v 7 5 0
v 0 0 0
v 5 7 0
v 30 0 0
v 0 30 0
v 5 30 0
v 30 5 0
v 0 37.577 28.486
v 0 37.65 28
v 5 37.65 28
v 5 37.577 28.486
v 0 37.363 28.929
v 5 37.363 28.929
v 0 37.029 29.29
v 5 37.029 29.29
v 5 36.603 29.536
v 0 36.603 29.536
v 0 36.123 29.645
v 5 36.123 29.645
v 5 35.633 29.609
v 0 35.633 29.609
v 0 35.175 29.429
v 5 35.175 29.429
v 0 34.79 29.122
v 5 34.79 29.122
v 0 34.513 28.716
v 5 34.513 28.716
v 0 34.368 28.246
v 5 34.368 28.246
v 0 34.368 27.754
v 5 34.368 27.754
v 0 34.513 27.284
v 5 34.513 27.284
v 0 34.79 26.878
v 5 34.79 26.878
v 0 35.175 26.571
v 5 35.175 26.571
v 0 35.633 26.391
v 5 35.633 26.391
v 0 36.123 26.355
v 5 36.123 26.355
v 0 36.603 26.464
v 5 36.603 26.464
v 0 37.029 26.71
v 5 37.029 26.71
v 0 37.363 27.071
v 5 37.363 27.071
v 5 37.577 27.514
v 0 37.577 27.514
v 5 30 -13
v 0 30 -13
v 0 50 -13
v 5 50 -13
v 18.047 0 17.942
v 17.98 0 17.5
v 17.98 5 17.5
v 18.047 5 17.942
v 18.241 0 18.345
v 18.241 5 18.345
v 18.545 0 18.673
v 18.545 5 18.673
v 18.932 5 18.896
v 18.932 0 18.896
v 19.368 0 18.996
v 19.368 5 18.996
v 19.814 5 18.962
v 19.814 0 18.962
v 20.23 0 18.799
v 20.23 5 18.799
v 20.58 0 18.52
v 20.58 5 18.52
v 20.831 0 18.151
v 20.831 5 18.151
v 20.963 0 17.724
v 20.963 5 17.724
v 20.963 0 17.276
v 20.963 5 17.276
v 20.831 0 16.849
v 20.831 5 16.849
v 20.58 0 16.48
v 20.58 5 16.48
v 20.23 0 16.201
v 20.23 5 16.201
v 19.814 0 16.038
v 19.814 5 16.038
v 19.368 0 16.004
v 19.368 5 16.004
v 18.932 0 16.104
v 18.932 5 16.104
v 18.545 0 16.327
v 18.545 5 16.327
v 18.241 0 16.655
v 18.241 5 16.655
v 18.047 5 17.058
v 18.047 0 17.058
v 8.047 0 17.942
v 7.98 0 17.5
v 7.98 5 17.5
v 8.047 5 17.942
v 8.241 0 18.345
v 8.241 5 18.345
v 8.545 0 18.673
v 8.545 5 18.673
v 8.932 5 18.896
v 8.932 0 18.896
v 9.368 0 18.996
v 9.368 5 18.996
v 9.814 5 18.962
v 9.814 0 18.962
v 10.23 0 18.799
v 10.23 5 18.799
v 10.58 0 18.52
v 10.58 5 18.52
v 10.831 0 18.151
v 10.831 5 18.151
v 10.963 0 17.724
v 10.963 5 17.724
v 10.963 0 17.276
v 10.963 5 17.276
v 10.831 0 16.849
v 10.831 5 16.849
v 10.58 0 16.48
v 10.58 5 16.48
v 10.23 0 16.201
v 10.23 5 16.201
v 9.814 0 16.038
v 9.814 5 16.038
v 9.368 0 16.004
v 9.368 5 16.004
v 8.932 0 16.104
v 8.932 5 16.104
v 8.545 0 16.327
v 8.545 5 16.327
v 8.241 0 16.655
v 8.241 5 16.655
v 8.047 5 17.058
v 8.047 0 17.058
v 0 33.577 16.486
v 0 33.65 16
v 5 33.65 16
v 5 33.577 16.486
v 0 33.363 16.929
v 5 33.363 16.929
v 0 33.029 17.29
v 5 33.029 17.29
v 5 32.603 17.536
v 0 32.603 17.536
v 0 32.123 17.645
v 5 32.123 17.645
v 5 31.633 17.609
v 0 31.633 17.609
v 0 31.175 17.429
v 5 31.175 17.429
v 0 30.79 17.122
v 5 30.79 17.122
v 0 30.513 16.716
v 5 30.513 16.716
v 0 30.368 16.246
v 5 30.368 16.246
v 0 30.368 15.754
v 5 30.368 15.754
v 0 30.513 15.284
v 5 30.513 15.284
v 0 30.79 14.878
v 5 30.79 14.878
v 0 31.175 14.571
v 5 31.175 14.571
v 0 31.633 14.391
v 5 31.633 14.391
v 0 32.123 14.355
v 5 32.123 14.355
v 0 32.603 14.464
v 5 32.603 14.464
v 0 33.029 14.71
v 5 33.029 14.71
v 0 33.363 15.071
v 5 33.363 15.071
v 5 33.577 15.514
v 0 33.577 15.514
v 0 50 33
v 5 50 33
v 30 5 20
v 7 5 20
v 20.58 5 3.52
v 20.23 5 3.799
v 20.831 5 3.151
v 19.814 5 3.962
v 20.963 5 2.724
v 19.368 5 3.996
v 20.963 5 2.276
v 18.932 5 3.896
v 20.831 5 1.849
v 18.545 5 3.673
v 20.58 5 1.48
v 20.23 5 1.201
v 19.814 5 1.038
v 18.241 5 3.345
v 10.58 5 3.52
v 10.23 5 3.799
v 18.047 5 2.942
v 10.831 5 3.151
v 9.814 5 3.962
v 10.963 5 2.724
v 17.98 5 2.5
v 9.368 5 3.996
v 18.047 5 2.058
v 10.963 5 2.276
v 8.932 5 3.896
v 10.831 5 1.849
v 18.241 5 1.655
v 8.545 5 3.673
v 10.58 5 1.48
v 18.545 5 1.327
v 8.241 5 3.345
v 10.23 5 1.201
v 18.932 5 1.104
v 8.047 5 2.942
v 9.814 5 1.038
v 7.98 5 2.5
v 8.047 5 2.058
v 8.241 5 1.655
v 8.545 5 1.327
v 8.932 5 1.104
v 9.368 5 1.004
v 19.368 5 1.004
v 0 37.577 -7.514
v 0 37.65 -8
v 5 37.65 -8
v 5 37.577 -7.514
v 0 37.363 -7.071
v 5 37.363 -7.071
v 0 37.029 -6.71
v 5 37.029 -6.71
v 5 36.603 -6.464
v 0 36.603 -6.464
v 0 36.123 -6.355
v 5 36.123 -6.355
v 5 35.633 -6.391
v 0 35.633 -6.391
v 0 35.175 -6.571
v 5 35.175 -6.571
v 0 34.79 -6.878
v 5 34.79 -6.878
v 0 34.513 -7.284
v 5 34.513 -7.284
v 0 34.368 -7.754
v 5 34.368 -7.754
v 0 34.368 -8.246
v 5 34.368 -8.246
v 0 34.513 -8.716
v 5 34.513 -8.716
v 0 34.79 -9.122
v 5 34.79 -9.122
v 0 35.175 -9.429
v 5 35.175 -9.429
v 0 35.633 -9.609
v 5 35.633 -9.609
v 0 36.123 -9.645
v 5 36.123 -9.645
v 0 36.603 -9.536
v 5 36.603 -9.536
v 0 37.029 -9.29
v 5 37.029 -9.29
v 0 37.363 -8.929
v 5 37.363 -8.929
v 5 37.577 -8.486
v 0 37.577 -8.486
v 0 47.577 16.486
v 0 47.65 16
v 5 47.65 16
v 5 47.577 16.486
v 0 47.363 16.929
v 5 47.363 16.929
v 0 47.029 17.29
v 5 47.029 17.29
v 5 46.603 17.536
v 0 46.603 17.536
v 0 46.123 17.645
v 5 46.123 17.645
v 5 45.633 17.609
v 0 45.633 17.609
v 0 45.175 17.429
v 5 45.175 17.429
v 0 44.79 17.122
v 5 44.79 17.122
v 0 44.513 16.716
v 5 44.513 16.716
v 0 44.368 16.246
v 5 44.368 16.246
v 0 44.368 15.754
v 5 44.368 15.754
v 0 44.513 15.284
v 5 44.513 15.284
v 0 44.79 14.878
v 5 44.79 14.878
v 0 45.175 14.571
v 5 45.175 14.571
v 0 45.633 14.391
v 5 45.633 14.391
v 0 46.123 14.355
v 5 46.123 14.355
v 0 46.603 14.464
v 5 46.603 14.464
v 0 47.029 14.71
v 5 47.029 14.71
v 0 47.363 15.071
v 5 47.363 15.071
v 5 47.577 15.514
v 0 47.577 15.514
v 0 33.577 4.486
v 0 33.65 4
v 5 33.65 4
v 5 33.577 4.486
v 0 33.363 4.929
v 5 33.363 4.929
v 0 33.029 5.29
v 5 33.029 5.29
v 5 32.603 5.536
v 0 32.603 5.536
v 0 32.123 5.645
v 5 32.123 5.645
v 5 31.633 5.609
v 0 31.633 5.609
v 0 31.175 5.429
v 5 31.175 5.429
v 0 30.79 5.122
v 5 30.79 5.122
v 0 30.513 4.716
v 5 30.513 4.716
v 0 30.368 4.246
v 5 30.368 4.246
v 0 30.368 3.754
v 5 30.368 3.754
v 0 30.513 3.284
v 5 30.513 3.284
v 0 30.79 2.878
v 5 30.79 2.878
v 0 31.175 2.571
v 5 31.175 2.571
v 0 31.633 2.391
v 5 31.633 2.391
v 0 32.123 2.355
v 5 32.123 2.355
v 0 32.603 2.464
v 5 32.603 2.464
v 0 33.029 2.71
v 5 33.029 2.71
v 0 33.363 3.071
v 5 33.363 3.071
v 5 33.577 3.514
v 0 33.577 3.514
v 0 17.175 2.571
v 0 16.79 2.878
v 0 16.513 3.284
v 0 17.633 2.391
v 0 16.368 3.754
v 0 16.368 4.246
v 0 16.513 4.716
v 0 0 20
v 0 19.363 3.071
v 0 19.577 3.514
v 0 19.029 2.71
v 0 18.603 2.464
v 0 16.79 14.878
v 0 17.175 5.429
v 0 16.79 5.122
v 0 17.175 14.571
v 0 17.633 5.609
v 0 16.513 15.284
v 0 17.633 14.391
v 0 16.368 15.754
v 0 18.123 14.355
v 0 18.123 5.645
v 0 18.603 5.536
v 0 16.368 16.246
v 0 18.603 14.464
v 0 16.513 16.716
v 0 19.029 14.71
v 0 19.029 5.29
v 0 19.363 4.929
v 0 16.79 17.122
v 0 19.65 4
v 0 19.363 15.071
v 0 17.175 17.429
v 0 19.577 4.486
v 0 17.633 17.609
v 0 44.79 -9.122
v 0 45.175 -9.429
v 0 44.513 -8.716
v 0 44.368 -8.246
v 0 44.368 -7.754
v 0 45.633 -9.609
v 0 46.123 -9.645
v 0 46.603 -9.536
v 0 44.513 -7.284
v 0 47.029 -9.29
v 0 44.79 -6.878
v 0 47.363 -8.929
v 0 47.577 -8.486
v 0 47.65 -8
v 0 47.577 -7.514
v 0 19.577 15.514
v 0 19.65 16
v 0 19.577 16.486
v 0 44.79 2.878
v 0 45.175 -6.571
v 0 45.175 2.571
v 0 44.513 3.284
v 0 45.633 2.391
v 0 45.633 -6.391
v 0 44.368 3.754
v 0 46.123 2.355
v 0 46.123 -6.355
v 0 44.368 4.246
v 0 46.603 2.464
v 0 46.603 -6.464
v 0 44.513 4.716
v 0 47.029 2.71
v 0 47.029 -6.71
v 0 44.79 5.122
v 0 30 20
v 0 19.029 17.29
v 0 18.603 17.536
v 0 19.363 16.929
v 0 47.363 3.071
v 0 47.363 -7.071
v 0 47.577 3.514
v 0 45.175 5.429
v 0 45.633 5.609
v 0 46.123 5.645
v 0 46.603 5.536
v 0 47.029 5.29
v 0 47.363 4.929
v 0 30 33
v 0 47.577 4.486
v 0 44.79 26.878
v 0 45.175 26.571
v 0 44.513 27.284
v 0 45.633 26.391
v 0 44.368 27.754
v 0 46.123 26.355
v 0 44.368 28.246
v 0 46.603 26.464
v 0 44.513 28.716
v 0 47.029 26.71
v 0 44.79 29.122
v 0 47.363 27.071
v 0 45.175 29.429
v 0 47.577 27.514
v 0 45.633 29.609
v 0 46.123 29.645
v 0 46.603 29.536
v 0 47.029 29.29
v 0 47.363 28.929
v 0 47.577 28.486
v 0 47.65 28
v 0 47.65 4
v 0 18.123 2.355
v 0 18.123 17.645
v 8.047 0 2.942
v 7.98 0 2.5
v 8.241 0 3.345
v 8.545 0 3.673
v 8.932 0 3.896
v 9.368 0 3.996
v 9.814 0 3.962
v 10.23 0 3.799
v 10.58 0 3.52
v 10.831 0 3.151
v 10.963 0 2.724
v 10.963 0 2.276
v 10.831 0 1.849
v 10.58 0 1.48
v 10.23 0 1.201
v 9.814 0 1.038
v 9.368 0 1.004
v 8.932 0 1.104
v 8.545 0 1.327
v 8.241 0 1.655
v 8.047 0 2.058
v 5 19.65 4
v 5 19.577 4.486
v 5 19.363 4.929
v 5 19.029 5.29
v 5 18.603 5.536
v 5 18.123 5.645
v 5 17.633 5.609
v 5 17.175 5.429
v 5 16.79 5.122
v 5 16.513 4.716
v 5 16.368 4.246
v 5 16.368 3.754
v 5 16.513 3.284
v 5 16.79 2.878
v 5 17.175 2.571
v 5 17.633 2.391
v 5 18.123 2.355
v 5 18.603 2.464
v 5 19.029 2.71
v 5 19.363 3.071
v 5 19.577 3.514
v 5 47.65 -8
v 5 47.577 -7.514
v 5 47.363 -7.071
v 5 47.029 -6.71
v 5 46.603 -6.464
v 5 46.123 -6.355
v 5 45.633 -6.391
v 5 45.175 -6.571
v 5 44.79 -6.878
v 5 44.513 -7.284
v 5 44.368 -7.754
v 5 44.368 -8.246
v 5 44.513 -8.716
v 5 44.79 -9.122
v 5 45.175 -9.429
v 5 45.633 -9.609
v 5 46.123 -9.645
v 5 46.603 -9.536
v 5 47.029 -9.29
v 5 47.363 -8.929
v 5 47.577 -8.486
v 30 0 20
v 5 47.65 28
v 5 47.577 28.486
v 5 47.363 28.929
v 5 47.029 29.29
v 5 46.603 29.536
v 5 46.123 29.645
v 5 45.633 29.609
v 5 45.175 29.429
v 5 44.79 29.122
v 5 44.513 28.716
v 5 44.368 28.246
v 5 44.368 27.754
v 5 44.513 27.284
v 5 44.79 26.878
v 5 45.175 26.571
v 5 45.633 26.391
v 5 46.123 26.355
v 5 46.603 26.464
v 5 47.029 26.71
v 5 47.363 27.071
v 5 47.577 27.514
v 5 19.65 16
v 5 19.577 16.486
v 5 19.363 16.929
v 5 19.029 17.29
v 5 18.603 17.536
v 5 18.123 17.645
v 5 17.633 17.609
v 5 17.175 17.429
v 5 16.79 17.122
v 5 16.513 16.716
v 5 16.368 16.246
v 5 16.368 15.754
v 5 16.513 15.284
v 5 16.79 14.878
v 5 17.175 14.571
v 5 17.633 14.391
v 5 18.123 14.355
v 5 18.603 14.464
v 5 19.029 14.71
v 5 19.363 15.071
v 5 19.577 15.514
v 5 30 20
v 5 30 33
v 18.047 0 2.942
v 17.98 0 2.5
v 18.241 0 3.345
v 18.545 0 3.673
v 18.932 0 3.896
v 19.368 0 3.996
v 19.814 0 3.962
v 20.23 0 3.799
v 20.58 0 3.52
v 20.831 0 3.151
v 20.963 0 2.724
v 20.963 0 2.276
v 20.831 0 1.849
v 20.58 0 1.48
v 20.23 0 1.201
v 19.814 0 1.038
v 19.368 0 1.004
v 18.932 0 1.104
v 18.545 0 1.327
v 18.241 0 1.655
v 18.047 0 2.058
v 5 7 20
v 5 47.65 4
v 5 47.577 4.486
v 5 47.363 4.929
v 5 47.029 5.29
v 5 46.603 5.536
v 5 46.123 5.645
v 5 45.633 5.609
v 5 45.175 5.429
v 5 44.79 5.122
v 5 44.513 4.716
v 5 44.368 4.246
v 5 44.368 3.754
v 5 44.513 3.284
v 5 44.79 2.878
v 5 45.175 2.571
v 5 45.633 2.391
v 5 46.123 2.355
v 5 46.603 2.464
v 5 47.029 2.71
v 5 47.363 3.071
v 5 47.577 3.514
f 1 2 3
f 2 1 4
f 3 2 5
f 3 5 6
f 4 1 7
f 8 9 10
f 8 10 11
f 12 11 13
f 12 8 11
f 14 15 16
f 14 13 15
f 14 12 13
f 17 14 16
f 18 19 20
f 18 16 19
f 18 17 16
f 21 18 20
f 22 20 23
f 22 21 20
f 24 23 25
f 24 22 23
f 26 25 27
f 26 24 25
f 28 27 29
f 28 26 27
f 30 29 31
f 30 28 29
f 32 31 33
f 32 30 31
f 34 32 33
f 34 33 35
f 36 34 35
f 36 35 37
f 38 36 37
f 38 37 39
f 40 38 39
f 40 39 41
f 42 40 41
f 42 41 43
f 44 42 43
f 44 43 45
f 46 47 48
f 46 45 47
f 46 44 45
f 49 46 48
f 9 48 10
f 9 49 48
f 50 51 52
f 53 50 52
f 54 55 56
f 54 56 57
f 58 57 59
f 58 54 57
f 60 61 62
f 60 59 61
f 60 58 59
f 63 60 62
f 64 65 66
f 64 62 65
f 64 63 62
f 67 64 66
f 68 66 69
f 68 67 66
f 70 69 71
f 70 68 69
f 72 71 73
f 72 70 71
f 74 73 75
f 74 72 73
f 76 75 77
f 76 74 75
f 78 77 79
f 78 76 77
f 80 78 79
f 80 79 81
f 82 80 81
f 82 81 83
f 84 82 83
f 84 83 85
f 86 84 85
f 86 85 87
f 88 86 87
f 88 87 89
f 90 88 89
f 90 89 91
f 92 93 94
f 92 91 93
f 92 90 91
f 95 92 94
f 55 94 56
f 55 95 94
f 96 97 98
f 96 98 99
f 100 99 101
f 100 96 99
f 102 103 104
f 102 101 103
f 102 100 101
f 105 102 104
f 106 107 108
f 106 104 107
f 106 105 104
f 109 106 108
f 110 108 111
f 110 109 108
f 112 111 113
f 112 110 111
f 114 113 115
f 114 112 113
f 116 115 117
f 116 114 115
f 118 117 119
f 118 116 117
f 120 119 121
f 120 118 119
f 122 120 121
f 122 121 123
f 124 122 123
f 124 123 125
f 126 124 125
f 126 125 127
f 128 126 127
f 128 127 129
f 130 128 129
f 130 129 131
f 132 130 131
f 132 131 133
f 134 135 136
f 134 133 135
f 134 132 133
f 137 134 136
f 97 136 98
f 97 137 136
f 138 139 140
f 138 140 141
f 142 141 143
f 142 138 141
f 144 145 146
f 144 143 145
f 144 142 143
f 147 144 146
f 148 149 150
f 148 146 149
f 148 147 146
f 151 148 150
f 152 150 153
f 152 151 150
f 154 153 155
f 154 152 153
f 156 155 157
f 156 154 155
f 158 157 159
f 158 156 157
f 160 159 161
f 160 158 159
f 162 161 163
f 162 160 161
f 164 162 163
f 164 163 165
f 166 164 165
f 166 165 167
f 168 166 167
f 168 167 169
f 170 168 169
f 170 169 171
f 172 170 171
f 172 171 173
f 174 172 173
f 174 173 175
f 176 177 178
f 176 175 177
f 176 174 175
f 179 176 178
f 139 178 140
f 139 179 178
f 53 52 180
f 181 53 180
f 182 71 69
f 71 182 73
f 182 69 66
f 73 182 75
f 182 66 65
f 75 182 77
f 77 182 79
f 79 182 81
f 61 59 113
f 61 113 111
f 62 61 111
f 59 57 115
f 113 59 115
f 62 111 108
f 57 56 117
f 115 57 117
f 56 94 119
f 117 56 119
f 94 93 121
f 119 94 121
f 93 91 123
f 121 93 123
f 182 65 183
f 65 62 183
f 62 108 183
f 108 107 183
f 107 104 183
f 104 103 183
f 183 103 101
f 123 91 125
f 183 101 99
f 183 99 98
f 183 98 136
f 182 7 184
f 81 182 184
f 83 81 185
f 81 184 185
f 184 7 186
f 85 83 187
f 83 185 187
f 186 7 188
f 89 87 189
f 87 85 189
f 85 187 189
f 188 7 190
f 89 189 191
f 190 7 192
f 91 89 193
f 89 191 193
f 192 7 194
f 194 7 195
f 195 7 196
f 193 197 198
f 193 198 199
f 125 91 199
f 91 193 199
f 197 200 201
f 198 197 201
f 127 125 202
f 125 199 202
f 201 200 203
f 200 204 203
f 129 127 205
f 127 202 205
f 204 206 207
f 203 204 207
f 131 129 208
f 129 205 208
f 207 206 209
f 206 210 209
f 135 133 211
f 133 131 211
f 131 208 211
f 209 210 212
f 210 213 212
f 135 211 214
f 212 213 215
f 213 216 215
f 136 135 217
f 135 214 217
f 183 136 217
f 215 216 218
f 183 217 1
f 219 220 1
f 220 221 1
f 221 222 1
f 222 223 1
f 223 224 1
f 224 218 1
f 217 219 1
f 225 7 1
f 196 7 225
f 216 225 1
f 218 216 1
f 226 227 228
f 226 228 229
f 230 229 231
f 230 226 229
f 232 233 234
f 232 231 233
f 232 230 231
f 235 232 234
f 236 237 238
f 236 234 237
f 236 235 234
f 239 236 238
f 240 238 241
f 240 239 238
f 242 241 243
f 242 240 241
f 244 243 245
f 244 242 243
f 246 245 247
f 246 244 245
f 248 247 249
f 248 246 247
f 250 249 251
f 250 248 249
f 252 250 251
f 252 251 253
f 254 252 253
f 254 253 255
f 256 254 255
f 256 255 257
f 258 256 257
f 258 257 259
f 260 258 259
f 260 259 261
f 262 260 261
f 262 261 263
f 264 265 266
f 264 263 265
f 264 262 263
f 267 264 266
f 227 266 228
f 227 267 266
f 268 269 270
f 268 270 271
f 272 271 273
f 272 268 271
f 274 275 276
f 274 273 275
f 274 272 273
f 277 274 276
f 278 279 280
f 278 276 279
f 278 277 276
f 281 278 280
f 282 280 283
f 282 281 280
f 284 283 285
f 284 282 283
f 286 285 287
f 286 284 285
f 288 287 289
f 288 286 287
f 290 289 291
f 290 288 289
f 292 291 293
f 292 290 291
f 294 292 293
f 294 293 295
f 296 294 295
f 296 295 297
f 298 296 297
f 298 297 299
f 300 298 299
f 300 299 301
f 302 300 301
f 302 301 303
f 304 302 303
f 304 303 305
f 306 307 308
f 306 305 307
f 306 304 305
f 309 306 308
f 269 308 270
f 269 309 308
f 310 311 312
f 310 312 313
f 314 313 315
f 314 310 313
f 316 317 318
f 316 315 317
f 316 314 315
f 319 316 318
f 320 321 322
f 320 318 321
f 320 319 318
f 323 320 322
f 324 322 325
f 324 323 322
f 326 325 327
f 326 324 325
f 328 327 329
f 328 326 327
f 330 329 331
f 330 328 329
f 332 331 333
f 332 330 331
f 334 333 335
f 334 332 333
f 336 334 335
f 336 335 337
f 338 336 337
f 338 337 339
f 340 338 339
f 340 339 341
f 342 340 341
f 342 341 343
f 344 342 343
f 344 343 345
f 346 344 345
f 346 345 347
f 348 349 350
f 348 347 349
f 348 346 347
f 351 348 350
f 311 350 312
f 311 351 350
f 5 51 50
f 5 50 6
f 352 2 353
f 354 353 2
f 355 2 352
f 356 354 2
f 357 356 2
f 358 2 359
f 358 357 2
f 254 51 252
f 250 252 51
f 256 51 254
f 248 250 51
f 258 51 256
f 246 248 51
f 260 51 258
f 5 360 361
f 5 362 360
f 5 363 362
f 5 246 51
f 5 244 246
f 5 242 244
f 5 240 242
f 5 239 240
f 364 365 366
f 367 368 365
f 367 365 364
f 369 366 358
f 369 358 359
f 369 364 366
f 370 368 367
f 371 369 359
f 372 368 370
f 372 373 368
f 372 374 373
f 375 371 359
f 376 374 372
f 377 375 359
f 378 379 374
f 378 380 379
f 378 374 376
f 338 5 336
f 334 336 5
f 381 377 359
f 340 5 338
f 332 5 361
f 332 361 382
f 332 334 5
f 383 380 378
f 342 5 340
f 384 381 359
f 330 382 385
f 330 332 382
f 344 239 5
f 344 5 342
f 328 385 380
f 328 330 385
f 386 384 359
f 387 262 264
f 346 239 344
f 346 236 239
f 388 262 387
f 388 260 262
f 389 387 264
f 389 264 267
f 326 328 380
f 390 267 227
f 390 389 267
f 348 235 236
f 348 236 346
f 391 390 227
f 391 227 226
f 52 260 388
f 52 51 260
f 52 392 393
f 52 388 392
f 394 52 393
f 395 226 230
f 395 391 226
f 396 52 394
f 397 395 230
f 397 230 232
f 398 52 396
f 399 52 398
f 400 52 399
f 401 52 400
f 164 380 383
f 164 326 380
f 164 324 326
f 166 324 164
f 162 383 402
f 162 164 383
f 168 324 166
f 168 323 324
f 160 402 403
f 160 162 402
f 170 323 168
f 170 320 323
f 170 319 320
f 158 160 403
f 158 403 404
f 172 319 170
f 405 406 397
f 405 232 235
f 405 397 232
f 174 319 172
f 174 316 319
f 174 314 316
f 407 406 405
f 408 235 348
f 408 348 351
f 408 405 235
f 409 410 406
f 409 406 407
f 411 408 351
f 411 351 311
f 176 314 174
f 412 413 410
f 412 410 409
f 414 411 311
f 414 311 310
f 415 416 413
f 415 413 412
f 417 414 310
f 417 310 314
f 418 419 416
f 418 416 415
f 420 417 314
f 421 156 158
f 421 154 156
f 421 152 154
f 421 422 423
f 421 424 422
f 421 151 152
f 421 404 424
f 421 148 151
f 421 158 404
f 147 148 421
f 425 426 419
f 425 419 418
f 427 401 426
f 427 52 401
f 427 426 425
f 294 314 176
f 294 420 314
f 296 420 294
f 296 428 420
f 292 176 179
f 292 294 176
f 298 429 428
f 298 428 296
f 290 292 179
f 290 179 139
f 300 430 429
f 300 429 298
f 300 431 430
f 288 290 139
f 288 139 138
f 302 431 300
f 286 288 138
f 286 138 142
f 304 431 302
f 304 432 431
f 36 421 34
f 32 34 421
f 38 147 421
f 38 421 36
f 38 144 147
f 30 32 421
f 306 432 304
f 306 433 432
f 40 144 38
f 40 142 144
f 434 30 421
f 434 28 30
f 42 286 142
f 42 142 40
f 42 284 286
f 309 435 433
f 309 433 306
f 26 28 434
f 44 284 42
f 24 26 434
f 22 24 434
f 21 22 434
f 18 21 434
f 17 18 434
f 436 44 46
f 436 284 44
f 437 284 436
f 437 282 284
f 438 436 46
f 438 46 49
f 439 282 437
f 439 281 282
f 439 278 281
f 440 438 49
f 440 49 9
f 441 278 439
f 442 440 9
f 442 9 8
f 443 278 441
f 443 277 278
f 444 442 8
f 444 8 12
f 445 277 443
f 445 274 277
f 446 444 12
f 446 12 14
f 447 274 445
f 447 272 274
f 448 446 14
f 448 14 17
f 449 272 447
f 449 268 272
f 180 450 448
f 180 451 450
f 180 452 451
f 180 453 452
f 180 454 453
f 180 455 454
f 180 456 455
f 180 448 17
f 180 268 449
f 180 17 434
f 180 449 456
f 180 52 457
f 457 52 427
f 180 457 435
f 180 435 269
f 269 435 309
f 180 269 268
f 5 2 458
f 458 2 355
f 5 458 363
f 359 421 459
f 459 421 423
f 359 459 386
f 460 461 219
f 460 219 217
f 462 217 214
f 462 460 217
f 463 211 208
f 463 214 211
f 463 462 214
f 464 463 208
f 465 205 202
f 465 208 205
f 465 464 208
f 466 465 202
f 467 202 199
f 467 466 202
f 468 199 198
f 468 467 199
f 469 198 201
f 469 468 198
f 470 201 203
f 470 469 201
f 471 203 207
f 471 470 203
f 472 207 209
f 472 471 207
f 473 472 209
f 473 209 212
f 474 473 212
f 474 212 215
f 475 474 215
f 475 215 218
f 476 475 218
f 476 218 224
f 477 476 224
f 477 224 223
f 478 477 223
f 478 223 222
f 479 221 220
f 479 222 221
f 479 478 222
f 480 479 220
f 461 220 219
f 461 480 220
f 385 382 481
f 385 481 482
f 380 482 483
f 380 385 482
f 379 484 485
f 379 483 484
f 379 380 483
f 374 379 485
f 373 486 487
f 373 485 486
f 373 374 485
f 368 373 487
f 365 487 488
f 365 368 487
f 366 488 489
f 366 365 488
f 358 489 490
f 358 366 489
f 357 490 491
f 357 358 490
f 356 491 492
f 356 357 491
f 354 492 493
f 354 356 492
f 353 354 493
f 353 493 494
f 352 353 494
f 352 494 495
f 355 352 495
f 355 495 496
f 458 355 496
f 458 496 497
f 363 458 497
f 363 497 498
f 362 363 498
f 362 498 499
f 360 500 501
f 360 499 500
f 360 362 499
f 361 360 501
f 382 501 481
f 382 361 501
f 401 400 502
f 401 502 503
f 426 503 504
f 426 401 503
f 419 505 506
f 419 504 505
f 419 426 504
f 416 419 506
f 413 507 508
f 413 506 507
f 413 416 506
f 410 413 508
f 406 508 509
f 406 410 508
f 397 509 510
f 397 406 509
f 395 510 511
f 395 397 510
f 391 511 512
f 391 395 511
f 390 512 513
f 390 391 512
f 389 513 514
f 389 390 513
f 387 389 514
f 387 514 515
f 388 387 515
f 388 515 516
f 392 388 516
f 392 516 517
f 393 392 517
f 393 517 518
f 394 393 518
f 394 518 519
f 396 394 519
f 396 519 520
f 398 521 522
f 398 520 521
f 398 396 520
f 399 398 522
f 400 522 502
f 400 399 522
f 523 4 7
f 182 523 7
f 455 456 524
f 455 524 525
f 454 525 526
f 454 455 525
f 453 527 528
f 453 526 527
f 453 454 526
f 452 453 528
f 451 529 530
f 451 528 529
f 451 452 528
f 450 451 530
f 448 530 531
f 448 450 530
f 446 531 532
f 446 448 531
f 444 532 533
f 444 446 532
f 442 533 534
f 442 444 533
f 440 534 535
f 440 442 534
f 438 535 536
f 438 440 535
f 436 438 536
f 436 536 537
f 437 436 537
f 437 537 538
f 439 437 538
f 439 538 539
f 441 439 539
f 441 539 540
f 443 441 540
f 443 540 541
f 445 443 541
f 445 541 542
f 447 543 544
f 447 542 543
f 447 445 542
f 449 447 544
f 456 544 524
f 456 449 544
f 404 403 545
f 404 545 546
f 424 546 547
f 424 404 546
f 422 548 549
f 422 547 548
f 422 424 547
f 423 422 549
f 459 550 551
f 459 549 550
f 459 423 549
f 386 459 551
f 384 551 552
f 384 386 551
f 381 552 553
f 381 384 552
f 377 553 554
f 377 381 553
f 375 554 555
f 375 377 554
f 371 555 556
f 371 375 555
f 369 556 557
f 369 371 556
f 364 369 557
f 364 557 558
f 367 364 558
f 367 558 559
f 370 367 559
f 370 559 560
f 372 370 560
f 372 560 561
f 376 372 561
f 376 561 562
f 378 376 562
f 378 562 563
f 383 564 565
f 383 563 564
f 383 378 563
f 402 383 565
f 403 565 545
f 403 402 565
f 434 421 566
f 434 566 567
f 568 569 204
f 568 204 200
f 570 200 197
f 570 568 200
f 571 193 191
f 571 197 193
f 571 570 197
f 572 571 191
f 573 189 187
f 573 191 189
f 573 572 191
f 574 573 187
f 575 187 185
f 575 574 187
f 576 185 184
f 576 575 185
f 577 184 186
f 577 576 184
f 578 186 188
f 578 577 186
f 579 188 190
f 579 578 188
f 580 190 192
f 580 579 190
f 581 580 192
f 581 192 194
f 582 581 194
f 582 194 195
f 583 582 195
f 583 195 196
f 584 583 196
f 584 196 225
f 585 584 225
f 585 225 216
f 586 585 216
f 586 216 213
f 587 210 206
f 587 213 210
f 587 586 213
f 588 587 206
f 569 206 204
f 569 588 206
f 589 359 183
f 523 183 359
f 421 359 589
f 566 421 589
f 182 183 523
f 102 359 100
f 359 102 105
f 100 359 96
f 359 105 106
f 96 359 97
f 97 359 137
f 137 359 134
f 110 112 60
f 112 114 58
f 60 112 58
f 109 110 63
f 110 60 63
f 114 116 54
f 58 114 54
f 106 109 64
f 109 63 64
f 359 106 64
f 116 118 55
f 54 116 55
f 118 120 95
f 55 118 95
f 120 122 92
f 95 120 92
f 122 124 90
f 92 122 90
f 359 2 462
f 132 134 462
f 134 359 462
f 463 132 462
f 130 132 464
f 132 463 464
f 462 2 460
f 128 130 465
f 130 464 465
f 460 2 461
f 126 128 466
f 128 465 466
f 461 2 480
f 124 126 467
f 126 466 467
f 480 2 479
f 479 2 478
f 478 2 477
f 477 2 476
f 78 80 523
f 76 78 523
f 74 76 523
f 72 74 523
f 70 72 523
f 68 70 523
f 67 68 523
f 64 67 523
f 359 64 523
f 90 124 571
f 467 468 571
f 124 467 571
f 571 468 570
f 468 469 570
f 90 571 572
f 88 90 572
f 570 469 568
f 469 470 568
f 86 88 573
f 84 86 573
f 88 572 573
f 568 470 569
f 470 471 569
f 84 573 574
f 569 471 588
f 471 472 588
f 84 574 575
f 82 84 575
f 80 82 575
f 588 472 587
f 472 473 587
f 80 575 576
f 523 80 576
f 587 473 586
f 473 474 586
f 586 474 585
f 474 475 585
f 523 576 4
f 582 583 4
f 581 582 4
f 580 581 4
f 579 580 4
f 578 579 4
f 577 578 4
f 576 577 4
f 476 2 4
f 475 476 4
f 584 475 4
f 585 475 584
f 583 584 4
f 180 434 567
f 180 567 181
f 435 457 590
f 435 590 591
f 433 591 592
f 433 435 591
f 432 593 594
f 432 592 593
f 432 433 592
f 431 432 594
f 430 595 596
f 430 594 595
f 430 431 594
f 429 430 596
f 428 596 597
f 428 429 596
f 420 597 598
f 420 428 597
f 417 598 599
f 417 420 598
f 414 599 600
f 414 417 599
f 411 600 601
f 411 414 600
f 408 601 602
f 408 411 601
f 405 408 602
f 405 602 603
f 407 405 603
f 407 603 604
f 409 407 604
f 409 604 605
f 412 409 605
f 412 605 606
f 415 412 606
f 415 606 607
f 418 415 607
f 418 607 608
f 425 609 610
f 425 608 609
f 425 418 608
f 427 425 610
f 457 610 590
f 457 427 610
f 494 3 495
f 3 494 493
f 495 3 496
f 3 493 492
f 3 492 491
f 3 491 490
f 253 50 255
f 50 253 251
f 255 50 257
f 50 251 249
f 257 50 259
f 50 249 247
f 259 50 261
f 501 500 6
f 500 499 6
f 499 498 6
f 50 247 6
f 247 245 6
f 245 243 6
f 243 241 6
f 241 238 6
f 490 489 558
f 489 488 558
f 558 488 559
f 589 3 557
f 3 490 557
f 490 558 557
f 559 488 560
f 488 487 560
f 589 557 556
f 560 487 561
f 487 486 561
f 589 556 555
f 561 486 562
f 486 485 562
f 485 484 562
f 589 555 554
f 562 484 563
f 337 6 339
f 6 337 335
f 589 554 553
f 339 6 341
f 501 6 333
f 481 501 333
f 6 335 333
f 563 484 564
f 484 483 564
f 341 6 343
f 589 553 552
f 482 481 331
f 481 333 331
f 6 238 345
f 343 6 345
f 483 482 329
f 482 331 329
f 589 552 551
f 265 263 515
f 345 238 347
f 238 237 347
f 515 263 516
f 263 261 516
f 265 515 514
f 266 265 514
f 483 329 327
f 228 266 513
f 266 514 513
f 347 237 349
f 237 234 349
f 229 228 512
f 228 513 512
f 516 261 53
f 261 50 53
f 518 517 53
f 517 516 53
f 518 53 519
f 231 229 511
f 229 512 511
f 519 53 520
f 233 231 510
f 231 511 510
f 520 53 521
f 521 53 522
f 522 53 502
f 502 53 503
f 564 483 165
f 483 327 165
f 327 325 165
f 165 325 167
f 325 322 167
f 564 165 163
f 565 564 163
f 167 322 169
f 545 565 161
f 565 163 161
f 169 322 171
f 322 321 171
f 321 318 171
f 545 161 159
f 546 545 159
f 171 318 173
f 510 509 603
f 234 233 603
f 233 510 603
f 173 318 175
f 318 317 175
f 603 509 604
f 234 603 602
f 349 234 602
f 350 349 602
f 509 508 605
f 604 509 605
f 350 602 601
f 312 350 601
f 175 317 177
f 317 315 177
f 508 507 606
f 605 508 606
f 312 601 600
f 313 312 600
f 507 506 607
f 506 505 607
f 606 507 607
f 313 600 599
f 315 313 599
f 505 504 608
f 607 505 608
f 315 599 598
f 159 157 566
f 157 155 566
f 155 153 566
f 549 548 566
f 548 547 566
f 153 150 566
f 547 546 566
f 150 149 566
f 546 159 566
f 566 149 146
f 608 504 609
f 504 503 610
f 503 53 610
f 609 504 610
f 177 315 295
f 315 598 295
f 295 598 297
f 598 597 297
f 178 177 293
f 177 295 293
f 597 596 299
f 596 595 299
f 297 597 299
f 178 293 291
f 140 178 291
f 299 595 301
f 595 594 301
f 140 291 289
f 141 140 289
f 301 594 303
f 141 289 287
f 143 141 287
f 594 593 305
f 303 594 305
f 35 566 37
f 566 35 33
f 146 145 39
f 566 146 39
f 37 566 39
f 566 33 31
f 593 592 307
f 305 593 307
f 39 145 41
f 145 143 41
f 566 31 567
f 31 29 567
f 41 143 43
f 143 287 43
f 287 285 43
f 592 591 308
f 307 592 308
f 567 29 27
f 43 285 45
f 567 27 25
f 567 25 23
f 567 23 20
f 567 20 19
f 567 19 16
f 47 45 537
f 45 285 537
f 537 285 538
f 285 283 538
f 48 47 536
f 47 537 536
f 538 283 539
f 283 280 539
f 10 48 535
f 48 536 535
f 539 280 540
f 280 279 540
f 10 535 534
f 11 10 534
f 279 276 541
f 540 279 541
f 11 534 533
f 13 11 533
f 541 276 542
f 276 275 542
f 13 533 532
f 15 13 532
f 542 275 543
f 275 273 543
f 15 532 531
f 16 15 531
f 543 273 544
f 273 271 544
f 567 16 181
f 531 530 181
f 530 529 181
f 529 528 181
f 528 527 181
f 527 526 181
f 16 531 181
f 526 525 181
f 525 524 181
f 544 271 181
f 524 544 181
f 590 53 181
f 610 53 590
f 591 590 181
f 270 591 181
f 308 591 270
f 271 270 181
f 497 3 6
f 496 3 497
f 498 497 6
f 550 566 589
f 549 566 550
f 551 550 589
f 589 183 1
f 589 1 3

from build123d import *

# Parameters (mm, degrees)
EXTRUDE_1_DEPTH          = 20
CUT_EXTRUDE_2_DEPTH      = 60.371710435
CUT_EXTRUDE_2_DEPTH_BACK = 60.371710435
SKETCH_3_R               = 1.65
SKETCH_4_W               = 13
SKETCH_4_H               = 20
EXTRUDE_2_DEPTH          = 5
CUT_EXTRUDE_3_DEPTH      = 65.915329468
CUT_EXTRUDE_3_DEPTH_BACK = 65.915329468
SKETCH_5_R               = 1.65
CUT_EXTRUDE_6_DEPTH      = 64.356136246
CUT_EXTRUDE_6_DEPTH_BACK = 64.356136246
SKETCH_2_R               = 1.5


with BuildPart() as part:
    # 草图1 → 凸台-拉伸1 (new body)
    with BuildSketch(Plane.XY):
        Polygon((0, 50), (0, 0), (30, 0), (30, 5), (7, 5), (5, 7), (5, 50), align=None)
    extrude(amount=EXTRUDE_1_DEPTH)

    # 草图3 → 切除-拉伸2 (cut, two sides: drawn at the far end of the back side and taken through both)
    with BuildSketch(Plane(origin=(5, 0, 0), x_dir=(0, 0, -1), z_dir=(1, 0, 0)).offset(-CUT_EXTRUDE_2_DEPTH_BACK)):
        with Locations(Location((-4, 46, 0), (0, 0, 90))):
            Circle(SKETCH_3_R)
        with Locations(Location((-16, 46, 0), (0, 0, 90))):
            Circle(SKETCH_3_R)
        with Locations(Location((-4, 32, 0), (0, 0, 90))):
            Circle(SKETCH_3_R)
        with Locations(Location((-16, 32, 0), (0, 0, 90))):
            Circle(SKETCH_3_R)
        with Locations(Location((-16, 18, 0), (0, 0, 90))):
            Circle(SKETCH_3_R)
        with Locations(Location((-4, 18, 0), (0, 0, 90))):
            Circle(SKETCH_3_R)
    extrude(amount=CUT_EXTRUDE_2_DEPTH + CUT_EXTRUDE_2_DEPTH_BACK, mode=Mode.SUBTRACT)

    # 草图4 → 凸台-拉伸2 (add)
    with BuildSketch(Plane.ZY):
        with Locations((26.5, 40)):
            Rectangle(SKETCH_4_W, SKETCH_4_H)
        with Locations((-6.5, 40)):
            Rectangle(SKETCH_4_W, SKETCH_4_H)
    extrude(amount=-EXTRUDE_2_DEPTH)

    # 草图5 → 切除-拉伸3 (cut, two sides: drawn at the far end of the back side and taken through both)
    with BuildSketch(Plane(origin=(5, 0, 0), x_dir=(0, 0, -1), z_dir=(1, 0, 0)).offset(-CUT_EXTRUDE_3_DEPTH_BACK)):
        with Locations(Location((-28, 46, 0), (0, 0, 90))):
            Circle(SKETCH_5_R)
        with Locations(Location((-28, 36, 0), (0, 0, 90))):
            Circle(SKETCH_5_R)
        with Locations(Location((8, 46, 0), (0, 0, 90))):
            Circle(SKETCH_5_R)
        with Locations(Location((8, 36, 0), (0, 0, 90))):
            Circle(SKETCH_5_R)
    extrude(amount=CUT_EXTRUDE_3_DEPTH + CUT_EXTRUDE_3_DEPTH_BACK, mode=Mode.SUBTRACT)

    # 草图2 → 切除-拉伸6 (cut, two sides: drawn at the far end of the back side and taken through both)
    with BuildSketch(Plane(origin=(0, 5, 0), x_dir=(1, 0, 0), z_dir=(0, 1, 0)).offset(-CUT_EXTRUDE_6_DEPTH_BACK)):
        with Locations(Location((9.48, -17.5, 0), (0, 0, 180))):
            Circle(SKETCH_2_R)
        with Locations(Location((19.48, -17.5, 0), (0, 0, 180))):
            Circle(SKETCH_2_R)
        with Locations(Location((19.48, -2.5, 0), (0, 0, 180))):
            Circle(SKETCH_2_R)
        with Locations(Location((9.48, -2.5, 0), (0, 0, 180))):
            Circle(SKETCH_2_R)
    extrude(amount=CUT_EXTRUDE_6_DEPTH + CUT_EXTRUDE_6_DEPTH_BACK, mode=Mode.SUBTRACT)


solid = part.part
